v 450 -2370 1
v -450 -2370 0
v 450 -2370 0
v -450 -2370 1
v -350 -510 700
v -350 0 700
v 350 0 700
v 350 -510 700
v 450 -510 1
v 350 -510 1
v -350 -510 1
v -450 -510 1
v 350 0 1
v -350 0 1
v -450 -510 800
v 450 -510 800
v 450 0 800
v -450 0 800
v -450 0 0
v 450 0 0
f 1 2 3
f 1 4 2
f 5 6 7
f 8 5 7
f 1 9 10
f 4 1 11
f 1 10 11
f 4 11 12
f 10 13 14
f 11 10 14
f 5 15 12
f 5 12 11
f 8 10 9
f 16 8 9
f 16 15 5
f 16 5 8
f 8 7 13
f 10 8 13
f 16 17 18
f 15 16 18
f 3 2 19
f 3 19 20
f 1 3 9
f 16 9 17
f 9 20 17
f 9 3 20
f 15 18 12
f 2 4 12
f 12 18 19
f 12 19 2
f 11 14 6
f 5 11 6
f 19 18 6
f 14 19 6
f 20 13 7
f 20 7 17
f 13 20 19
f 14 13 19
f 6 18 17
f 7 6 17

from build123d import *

# Parameters (mm, degrees)
F1_DEPTH = 510
F3_DEPTH = 2370


with BuildPart() as f1:
    # F0 (on Front) → F1 (new body)
    with BuildSketch(Plane.XZ):
        Polygon((450, 800), (0, 800), (-450, 800), (-450, 0), (-350, 0), (-350, 700), (0, 700), (350, 700), (350, 0), (450, 0), align=None)
    extrude(amount=F1_DEPTH)

    # F2 (on Front) → F3 (join)
    with BuildSketch(Plane.XZ):
        Polygon((-450, 0), (0, 0), (450, 0), (450, 1), (-450, 1), align=None)
    extrude(amount=F3_DEPTH)


solid = f1.part
